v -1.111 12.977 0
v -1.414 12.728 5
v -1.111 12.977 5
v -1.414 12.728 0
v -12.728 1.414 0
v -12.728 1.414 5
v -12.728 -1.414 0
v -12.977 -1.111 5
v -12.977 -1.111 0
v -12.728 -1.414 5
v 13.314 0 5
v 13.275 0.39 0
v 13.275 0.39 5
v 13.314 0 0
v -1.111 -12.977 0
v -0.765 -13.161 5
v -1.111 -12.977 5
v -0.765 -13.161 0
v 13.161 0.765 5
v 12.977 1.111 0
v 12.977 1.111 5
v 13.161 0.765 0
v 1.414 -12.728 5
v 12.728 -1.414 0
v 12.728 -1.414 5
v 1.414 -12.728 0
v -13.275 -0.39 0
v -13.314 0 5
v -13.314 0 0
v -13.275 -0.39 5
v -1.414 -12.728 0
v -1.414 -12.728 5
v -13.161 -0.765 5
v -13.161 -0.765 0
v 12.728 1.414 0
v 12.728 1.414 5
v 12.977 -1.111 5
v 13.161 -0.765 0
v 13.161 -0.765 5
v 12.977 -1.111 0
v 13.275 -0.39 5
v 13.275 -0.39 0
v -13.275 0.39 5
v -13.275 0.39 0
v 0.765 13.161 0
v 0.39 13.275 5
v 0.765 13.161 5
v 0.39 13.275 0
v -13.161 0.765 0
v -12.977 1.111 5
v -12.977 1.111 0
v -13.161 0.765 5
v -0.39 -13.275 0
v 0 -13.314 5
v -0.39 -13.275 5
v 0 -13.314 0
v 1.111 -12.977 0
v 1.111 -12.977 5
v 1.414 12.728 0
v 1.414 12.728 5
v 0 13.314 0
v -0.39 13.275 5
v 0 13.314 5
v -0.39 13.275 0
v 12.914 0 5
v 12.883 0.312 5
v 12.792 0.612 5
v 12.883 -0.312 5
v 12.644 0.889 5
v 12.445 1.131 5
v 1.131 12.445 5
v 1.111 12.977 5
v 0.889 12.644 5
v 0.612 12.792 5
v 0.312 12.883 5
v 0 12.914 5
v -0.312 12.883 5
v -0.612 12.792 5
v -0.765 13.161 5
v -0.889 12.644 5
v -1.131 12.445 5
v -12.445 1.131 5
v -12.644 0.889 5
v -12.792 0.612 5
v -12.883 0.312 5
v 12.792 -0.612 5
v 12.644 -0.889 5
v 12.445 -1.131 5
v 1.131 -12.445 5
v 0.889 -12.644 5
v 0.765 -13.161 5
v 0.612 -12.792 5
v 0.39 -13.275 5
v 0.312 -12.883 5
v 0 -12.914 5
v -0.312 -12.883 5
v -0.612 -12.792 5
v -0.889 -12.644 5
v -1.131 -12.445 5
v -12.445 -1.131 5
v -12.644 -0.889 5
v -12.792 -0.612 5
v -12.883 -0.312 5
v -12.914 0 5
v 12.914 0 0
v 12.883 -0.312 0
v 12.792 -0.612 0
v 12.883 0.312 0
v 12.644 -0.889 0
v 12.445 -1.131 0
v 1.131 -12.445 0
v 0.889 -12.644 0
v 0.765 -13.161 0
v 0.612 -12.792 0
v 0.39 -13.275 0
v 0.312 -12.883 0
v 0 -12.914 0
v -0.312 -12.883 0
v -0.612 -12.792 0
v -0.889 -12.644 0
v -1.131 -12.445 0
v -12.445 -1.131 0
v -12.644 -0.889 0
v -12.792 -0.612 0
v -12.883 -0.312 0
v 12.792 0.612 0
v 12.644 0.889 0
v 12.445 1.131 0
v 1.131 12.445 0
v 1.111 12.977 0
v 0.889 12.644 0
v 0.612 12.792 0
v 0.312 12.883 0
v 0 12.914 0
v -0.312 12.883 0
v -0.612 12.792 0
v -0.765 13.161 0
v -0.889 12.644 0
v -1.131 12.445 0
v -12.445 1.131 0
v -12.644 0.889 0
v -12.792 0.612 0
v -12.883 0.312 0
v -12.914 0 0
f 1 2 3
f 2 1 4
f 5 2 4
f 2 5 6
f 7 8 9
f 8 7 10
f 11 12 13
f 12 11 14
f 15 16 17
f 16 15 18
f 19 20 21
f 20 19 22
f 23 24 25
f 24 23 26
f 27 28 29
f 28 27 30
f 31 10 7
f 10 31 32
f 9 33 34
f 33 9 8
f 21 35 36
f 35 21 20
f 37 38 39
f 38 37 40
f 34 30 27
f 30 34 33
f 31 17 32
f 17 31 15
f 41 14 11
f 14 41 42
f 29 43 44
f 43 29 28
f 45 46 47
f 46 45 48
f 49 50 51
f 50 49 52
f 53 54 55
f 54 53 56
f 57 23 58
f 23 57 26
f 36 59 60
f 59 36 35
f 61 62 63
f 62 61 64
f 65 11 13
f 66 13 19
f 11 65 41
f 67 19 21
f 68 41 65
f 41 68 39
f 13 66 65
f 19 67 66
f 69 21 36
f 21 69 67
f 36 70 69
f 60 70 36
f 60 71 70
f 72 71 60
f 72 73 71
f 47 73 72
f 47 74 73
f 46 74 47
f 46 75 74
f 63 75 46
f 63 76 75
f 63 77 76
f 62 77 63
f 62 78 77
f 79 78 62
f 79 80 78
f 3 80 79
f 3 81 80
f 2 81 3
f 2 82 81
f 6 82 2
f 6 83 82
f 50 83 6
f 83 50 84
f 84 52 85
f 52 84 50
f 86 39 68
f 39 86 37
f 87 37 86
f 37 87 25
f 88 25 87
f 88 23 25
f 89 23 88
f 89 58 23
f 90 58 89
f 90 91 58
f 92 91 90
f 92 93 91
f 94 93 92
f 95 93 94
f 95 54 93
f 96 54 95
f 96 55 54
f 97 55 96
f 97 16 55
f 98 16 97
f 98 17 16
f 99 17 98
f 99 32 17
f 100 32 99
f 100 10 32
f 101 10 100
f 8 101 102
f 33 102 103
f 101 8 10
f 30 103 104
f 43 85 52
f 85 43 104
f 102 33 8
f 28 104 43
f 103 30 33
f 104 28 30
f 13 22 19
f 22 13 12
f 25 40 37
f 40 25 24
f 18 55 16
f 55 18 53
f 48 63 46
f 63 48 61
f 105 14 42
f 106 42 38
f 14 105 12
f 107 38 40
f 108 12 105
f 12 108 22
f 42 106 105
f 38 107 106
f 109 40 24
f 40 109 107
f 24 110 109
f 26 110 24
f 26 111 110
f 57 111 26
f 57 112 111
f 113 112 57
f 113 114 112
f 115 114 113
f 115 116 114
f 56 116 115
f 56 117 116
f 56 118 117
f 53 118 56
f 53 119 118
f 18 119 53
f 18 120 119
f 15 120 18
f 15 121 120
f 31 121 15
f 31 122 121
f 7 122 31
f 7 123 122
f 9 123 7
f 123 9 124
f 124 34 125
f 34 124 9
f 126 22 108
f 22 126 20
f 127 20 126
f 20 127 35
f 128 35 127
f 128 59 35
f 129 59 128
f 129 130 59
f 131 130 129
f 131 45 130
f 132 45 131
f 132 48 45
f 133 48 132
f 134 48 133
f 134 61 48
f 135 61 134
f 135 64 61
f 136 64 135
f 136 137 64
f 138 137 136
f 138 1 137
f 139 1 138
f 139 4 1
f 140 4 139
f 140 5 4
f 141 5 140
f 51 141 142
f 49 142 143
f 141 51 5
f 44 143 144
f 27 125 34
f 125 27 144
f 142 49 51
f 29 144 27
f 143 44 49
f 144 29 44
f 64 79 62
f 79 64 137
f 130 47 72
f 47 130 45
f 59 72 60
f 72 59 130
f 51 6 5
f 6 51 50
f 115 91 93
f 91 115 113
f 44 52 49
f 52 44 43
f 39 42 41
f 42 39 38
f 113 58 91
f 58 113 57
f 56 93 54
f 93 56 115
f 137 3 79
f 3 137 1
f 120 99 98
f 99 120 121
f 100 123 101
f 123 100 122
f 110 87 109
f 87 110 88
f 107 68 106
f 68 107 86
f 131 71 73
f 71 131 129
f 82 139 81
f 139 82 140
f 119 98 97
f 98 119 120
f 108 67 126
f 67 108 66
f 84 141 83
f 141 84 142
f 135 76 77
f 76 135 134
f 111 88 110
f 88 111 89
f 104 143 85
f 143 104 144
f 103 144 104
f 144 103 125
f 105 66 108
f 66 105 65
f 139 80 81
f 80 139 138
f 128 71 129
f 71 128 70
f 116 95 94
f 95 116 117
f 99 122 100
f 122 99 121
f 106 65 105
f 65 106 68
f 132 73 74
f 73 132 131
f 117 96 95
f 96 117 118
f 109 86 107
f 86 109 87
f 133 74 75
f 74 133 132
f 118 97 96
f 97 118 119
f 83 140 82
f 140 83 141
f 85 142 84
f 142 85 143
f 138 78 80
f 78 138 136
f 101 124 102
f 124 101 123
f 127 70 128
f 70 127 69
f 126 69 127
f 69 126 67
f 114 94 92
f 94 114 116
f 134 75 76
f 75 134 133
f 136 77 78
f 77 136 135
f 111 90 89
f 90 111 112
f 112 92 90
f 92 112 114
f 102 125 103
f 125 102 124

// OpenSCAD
// Thin wall open box calibration piece
// Adapted from Coasterman's Calibration set
// Ed Nisley - KE4ZNU - Dec 2011
// Adjust for Slic3r/M2 - March 2013
// Reworked for hull() with correct corner radii - April 2014
 
//-------
//- Extrusion parameters must match reality!
//  None of the fill parameters matter
 
ThreadThick = 0.2;
ThreadWidth = 0.40;
 
Protrusion = 0.1;           // make holes end cleanly
 
function IntegerMultiple(Size,Unit) = Unit * ceil(Size / Unit);
 
//-------
// Dimensions
 
Height = IntegerMultiple(5.0,ThreadThick);
 
WallThick = ThreadWidth;
 
CornerRadius = 2.0;
CornerSides = 4*8;
 
SideLen = 20.0 - 2*CornerRadius;
 
Rotation = 45;
 
//-------
 
module ShowPegGrid(Space = 10.0,Size = 1.0) {
 
  Range = floor(50 / Space);
 
    for (x=[-Range:Range])
      for (y=[-Range:Range])
        translate([x*Space,y*Space,Size/2])
          %cube(Size,center=true);
}
 
//-------
 
ShowPegGrid();
 
rotate(Rotation)
    difference() {
        hull() {
            for (i=[-1,1], j=[-1,1])
                translate([i*SideLen/2,j*SideLen/2,0])
                    cylinder(r=CornerRadius,h=Height,$fn=CornerSides);
        }
        hull() {
            for (i=[-1,1], j=[-1,1])
                translate([i*SideLen/2,j*SideLen/2,-Protrusion])
                    cylinder(r=(CornerRadius - WallThick),h=(Height + 2*Protrusion),$fn=CornerSides);
        }
    }
